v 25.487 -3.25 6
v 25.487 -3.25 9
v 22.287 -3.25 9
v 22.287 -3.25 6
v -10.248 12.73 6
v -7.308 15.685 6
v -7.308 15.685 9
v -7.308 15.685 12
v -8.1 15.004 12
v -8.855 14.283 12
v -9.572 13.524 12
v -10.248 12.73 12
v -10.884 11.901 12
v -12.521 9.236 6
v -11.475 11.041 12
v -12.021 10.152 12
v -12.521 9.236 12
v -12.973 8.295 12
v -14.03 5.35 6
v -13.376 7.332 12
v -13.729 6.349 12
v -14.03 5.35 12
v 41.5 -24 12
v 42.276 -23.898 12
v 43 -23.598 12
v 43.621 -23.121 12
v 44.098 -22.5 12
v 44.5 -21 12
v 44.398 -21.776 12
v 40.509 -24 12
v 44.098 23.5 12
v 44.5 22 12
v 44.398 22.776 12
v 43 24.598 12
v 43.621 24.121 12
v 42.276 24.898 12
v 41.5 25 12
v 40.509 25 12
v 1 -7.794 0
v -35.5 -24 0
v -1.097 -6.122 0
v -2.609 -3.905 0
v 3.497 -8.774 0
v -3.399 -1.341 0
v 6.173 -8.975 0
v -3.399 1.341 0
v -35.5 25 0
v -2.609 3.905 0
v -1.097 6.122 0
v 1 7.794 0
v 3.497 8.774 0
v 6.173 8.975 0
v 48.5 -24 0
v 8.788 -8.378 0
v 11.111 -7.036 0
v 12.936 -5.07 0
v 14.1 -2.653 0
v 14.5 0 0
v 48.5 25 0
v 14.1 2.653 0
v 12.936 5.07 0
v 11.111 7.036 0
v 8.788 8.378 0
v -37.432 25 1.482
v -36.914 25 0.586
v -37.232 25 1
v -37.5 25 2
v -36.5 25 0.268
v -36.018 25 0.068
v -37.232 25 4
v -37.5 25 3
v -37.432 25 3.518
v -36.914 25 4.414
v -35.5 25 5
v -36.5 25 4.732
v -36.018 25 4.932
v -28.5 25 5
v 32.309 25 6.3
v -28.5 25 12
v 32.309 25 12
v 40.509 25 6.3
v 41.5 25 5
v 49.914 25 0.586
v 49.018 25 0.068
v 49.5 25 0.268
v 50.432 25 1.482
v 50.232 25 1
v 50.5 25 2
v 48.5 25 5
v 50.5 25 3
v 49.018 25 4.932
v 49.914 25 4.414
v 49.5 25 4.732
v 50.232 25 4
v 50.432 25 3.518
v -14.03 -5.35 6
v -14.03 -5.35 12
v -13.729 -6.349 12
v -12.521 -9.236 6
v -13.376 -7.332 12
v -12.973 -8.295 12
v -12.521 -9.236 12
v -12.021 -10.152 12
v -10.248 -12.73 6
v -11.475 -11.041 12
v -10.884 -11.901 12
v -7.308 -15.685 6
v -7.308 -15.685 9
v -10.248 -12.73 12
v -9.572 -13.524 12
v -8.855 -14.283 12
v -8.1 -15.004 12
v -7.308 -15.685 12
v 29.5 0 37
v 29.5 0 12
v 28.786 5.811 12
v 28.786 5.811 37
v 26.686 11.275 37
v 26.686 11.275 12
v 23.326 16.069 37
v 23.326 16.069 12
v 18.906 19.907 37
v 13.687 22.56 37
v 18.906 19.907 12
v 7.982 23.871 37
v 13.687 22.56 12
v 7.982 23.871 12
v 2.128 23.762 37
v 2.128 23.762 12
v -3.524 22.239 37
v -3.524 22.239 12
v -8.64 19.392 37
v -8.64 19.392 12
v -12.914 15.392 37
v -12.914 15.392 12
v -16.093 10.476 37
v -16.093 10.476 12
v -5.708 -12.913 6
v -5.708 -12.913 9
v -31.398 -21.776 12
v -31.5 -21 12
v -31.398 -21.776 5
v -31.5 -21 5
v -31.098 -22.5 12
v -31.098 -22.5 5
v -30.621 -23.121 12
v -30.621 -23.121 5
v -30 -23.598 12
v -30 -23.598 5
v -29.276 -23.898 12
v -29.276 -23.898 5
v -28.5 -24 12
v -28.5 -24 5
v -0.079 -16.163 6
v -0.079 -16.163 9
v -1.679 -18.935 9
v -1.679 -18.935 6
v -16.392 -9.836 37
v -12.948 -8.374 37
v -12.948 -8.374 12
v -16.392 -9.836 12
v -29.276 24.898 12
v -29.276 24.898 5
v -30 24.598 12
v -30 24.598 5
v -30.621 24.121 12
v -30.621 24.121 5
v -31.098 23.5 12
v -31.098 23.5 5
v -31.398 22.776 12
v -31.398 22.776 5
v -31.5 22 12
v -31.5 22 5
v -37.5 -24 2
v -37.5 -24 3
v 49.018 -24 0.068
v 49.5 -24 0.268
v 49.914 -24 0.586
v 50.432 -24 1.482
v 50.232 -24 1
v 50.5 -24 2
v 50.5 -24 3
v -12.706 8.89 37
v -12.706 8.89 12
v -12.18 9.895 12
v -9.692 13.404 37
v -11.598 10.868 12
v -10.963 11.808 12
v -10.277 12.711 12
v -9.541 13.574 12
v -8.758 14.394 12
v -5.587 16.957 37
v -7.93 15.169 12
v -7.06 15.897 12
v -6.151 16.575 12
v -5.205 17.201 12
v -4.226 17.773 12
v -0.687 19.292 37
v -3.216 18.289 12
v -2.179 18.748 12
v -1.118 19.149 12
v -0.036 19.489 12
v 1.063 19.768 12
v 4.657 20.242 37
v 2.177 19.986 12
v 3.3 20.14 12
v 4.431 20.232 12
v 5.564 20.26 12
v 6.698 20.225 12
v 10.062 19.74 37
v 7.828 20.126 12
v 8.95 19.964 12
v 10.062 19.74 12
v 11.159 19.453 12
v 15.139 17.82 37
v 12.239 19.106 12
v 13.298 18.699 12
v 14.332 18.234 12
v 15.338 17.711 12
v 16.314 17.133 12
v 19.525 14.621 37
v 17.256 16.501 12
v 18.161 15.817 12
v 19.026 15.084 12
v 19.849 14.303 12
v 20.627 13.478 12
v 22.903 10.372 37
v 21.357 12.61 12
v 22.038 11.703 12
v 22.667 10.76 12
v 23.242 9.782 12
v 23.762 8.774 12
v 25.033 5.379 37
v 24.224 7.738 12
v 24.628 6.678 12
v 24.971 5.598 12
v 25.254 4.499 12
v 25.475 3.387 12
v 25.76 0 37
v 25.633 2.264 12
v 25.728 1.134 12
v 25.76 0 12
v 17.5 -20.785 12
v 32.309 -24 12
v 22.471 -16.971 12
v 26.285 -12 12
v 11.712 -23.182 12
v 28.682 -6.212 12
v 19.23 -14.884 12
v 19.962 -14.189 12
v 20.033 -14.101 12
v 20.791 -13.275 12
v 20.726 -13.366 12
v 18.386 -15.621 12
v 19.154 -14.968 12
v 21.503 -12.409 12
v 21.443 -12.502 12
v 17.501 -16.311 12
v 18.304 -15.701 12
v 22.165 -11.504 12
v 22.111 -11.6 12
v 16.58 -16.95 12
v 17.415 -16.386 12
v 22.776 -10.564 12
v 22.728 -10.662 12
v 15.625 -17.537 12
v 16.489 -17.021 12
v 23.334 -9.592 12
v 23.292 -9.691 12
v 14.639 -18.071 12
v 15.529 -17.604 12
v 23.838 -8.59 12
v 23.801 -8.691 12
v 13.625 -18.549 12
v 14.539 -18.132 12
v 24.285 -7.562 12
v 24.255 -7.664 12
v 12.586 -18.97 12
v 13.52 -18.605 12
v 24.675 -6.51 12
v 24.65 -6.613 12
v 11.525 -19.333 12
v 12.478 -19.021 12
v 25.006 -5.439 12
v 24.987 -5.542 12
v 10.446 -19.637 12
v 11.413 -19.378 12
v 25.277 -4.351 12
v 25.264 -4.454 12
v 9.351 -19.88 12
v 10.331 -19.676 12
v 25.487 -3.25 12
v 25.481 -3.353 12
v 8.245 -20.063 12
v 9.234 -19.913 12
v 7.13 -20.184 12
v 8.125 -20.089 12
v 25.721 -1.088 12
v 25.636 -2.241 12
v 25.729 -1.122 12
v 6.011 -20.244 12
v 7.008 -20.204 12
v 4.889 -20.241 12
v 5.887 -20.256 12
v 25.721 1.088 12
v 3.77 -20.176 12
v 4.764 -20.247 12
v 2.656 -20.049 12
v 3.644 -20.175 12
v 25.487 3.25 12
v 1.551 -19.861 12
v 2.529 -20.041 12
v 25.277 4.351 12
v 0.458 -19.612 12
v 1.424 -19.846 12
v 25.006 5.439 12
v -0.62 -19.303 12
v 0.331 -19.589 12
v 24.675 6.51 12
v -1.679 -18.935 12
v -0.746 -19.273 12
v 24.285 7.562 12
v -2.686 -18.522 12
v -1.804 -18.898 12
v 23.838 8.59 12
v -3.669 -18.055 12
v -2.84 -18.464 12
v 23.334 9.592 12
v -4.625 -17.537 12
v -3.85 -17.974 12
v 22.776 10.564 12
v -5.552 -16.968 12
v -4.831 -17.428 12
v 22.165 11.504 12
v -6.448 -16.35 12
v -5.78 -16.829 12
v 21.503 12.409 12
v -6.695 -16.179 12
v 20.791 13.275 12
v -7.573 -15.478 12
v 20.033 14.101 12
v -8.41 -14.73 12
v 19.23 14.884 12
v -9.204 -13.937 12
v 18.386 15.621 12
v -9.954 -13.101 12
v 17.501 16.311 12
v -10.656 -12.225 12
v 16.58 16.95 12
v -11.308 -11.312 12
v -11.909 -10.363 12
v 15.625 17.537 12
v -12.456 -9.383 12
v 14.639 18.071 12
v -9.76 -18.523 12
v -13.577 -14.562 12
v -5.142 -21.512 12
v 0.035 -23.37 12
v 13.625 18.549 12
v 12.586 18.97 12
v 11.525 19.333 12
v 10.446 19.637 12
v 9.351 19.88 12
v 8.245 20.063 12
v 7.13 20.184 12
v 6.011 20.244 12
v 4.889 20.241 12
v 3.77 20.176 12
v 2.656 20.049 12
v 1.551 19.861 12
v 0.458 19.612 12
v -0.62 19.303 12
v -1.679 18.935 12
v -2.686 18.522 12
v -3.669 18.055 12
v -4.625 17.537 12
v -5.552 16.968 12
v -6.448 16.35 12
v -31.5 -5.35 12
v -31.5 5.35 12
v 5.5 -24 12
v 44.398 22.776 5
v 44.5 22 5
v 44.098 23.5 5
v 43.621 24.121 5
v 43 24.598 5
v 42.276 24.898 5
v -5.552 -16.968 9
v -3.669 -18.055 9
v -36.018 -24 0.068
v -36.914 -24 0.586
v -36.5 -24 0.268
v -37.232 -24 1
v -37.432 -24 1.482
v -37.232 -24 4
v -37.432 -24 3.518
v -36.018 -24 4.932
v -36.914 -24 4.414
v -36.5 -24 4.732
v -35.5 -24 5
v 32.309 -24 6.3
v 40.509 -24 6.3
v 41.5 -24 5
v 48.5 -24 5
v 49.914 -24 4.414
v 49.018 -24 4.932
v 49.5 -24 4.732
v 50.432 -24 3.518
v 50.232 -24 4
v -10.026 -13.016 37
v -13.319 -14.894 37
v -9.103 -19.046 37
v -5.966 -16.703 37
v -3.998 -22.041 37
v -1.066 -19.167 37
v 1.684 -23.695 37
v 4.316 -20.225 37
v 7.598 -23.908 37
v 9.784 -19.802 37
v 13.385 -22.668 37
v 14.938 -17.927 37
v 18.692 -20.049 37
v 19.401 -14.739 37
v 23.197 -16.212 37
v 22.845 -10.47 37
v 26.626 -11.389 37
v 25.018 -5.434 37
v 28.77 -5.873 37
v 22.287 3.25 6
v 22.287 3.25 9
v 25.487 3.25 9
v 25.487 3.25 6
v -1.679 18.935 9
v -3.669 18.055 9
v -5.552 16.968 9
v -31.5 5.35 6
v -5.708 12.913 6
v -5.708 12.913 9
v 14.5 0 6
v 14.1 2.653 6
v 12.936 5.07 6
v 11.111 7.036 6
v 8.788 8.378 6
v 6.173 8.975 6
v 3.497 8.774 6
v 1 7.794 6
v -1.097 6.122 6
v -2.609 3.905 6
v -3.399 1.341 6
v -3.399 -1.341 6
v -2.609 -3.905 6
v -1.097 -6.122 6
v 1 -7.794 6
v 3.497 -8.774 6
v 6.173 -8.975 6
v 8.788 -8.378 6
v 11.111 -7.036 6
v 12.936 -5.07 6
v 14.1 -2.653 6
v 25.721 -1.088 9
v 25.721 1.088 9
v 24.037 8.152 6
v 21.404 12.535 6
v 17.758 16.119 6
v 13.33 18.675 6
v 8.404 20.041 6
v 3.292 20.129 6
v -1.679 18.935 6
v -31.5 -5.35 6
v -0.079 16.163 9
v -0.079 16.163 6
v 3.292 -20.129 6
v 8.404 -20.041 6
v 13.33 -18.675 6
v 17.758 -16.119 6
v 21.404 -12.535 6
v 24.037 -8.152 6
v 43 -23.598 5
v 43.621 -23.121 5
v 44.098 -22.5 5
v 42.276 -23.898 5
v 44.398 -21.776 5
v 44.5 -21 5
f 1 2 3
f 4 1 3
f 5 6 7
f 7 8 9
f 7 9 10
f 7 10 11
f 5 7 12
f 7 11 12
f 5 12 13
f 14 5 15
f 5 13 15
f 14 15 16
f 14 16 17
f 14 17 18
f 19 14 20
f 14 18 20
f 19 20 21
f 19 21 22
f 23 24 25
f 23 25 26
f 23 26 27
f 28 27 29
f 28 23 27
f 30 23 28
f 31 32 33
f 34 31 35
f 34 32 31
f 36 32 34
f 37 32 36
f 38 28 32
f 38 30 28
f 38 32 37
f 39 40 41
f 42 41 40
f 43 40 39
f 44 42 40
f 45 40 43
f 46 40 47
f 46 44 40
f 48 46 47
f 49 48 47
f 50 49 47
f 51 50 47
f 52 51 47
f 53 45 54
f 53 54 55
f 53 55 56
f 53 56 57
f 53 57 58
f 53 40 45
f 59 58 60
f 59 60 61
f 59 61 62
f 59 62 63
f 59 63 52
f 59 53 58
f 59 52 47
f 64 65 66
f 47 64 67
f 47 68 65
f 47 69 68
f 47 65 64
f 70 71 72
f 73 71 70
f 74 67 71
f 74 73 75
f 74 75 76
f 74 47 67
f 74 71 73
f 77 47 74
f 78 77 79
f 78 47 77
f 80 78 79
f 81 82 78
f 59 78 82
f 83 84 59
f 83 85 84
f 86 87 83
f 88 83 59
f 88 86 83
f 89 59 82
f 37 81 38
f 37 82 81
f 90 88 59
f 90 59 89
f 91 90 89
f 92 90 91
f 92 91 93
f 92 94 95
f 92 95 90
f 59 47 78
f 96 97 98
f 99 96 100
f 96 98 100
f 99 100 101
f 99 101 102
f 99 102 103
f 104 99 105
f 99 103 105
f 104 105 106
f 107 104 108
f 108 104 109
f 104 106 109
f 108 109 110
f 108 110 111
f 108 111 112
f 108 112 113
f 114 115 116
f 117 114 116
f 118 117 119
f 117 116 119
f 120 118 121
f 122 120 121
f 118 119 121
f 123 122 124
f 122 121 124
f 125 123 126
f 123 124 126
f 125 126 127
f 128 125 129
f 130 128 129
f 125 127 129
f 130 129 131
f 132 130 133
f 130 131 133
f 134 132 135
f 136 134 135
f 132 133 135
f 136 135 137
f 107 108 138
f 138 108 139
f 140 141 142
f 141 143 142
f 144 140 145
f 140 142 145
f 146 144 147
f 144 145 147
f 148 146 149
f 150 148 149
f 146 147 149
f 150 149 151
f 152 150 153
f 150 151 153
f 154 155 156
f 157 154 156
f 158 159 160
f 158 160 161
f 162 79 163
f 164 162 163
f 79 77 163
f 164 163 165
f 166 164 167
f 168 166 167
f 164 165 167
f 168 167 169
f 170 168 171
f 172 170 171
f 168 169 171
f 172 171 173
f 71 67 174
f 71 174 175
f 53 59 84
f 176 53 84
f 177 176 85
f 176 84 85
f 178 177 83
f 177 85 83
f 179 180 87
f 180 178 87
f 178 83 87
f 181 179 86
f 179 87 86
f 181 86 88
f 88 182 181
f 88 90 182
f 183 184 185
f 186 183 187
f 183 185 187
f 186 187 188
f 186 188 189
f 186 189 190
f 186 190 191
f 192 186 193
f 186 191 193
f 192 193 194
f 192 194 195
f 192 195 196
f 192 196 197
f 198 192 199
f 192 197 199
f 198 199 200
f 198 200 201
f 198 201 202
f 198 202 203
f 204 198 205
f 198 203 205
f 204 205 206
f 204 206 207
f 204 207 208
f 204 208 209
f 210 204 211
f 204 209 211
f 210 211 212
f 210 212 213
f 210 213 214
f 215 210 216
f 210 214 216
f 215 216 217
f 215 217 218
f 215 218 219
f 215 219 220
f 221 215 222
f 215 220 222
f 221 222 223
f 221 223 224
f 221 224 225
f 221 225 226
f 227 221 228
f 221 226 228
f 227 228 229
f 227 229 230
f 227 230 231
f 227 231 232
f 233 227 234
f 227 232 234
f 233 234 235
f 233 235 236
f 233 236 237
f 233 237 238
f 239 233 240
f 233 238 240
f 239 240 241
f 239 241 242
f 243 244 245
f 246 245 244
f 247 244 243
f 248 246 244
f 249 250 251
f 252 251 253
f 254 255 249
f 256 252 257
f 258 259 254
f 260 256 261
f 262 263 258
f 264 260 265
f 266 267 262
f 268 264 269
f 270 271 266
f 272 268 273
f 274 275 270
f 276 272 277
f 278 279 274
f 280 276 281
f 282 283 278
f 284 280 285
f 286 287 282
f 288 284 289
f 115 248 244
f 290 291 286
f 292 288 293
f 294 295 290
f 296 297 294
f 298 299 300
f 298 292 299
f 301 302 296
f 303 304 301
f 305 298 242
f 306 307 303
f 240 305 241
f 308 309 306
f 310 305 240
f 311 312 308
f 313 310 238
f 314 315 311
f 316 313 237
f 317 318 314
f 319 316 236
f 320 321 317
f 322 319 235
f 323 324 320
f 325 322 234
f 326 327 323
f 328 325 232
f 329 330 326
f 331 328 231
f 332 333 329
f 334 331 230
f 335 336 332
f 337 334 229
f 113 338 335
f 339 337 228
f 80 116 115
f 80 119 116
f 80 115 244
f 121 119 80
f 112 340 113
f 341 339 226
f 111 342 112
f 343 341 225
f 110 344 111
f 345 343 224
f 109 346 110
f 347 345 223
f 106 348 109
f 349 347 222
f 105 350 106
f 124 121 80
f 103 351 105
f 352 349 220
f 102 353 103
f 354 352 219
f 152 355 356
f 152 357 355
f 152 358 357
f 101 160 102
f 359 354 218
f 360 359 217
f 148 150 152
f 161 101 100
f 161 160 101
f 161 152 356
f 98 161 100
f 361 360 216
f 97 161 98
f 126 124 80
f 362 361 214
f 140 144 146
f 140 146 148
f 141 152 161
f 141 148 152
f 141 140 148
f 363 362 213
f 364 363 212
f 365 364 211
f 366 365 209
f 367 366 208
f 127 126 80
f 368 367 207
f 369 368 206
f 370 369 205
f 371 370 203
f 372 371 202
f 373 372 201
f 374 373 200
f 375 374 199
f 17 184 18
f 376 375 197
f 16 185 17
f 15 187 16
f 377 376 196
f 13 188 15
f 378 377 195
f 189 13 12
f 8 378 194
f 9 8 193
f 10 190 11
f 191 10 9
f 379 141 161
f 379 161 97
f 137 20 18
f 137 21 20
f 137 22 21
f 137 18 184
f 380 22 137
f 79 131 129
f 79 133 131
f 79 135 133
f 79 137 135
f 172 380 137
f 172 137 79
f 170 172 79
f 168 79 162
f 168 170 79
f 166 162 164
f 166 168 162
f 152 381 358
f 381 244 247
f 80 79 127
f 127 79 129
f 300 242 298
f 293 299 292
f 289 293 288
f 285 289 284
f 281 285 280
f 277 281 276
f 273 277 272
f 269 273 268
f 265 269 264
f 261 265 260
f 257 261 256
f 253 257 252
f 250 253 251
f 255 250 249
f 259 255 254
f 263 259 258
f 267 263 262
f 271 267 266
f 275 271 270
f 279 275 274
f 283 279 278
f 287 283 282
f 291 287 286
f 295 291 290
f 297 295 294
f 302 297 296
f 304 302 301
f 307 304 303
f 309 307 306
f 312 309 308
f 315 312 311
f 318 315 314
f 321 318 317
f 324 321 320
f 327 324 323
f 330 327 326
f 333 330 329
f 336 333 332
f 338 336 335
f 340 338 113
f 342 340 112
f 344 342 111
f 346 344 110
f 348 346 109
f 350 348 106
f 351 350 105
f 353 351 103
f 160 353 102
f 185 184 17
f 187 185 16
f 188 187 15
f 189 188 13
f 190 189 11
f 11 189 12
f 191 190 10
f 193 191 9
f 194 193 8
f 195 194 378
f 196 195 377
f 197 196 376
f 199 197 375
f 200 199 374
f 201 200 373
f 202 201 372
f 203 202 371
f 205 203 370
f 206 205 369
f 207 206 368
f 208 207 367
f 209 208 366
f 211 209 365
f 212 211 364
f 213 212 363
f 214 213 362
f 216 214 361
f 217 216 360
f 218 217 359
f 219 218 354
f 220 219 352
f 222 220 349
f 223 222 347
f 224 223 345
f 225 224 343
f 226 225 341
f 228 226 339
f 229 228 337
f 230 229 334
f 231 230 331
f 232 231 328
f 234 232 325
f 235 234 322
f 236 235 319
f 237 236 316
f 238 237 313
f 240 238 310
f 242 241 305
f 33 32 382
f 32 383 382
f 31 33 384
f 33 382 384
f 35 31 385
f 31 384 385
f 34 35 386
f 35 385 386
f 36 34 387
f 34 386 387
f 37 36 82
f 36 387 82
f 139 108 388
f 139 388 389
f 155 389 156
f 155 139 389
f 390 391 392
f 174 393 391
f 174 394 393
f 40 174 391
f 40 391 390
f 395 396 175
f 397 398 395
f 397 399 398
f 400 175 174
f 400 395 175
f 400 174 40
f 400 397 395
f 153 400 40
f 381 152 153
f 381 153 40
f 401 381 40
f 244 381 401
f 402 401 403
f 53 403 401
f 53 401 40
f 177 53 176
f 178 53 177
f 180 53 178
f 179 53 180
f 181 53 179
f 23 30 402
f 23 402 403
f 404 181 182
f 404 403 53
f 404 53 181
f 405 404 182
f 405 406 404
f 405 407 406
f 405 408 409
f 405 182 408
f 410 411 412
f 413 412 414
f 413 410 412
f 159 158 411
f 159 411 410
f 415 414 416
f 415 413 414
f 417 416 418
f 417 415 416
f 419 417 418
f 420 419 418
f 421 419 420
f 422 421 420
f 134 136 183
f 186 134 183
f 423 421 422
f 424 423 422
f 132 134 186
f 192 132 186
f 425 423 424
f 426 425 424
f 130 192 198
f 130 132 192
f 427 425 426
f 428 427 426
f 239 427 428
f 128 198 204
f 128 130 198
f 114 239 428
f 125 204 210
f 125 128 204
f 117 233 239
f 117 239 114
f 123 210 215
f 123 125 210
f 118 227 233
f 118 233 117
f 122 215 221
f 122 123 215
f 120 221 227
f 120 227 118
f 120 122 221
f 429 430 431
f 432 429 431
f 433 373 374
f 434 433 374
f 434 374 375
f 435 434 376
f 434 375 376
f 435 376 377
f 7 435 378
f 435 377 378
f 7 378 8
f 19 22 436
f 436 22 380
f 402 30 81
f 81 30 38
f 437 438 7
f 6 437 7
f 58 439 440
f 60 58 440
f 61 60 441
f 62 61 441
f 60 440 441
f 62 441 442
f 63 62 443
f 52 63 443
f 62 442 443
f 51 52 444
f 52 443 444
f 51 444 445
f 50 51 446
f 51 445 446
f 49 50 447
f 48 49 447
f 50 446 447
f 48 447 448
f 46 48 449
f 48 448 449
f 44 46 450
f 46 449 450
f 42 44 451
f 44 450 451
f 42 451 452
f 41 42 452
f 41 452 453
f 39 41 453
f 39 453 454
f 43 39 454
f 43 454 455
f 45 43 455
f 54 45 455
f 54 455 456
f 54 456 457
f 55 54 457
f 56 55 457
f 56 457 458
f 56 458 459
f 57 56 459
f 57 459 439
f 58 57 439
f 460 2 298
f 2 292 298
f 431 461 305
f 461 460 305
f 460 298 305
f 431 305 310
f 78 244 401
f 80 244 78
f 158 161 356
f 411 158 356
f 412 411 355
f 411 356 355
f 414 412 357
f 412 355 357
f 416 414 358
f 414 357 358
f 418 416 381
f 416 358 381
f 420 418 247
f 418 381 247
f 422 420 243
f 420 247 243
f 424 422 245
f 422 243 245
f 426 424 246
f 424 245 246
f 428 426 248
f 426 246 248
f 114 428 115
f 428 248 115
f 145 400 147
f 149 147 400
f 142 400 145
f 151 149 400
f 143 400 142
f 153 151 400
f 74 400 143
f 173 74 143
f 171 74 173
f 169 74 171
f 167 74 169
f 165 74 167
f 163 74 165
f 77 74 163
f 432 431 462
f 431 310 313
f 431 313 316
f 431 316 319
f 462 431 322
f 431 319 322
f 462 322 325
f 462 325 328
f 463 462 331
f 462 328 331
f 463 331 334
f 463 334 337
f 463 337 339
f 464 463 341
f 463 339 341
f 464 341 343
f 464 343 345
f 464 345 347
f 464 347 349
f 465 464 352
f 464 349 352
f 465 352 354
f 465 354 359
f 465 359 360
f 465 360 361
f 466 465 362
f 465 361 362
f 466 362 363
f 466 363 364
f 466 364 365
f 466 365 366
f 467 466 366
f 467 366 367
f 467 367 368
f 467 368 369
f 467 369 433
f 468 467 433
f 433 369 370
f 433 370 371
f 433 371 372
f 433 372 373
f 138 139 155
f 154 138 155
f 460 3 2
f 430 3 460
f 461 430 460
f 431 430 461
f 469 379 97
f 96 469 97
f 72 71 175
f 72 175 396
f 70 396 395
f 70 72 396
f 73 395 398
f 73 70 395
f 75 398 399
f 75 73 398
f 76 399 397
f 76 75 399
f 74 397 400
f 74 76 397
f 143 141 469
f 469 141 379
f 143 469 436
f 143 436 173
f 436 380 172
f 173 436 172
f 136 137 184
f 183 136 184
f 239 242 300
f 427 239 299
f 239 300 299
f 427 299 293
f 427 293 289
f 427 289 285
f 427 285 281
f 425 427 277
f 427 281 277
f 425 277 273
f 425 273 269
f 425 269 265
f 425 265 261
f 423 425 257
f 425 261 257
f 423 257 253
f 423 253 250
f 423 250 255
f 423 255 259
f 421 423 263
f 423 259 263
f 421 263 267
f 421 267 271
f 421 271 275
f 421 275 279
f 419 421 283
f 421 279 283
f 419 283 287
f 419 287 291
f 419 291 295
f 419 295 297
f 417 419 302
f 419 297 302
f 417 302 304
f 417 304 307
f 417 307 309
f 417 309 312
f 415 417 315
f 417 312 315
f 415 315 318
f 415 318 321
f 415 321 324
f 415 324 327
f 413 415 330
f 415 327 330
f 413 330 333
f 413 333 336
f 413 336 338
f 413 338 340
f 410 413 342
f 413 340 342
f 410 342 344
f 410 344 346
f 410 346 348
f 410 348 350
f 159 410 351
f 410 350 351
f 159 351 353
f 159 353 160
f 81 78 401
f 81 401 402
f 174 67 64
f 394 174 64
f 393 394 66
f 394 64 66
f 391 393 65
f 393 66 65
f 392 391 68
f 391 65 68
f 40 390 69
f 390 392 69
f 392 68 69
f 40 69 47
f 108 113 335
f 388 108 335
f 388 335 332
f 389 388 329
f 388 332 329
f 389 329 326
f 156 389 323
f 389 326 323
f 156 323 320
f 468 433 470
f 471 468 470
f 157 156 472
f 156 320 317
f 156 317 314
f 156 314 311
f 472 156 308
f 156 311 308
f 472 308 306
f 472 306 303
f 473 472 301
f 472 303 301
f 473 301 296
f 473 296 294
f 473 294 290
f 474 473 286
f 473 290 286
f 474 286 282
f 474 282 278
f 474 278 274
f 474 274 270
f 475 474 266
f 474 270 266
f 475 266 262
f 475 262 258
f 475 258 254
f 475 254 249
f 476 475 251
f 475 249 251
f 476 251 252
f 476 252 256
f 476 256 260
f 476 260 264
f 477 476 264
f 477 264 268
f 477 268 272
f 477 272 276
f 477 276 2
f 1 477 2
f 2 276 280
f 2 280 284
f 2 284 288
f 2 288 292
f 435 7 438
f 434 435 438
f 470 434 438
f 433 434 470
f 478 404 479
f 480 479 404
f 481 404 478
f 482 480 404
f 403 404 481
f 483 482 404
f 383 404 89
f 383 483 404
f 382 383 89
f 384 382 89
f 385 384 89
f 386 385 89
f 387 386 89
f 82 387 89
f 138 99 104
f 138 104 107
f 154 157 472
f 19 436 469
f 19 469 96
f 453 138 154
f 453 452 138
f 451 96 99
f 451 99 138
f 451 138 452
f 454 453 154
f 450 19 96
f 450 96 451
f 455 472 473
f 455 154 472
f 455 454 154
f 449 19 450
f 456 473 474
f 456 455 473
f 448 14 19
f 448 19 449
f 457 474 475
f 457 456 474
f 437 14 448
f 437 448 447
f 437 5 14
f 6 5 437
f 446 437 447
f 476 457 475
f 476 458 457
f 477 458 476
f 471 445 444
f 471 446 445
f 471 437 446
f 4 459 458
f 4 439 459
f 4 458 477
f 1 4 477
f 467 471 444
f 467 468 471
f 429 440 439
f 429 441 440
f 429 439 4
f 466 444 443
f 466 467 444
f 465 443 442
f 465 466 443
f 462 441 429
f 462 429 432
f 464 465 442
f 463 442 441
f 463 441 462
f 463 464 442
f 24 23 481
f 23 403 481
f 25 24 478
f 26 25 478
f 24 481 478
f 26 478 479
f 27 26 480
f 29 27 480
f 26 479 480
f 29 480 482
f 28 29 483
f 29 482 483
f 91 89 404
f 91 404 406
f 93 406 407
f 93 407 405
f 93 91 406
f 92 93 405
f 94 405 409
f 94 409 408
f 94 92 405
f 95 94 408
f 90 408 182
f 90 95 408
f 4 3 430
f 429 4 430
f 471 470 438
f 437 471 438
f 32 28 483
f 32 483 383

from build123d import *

# Parameters (mm, degrees)
SKETCH1_W           = 65
SKETCH1_H           = 50
BOSS_EXTRUDE1_DEPTH = 12
CUT_EXTRUDE1_DEPTH  = 6
SKETCH3_R           = 9
CUT_EXTRUDE2_DEPTH  = 7
SKETCH4_R           = 20.25
CUT_EXTRUDE3_DEPTH  = 3
SKETCH5_W           = 12
SKETCH5_H           = 50
BOSS_EXTRUDE2_DEPTH = 13
SKETCH6_W           = 8.2
SKETCH6_H           = 50
CUT_EXTRUDE4_DEPTH  = 5.7
SKETCH7_W           = 5
SKETCH7_H           = 50
BOSS_EXTRUDE3_DEPTH = 5
SKETCH8_W           = 5
SKETCH8_H           = 50
BOSS_EXTRUDE4_DEPTH = 5
FILLET1_R           = 2
FILLET2_R           = 2
BOSS_EXTRUDE6_DEPTH = 25
FILLET3_R           = 2
FILLET4_R           = 2
SKETCH10_W          = 1
SKETCH10_H          = 50
CUT_EXTRUDE5_DEPTH  = 7
SKETCH11_W          = 88
SKETCH11_H          = 1
CUT_EXTRUDE6_DEPTH  = 13
FILLET5_R           = 3
FILLET6_R           = 3
FILLET7_R           = 3
FILLET8_R           = 3


with BuildPart() as part:
    # Sketch1 → Boss-Extrude1 (new body)
    with BuildSketch(Plane.XY):
        Rectangle(SKETCH1_W, SKETCH1_H)
    extrude(amount=BOSS_EXTRUDE1_DEPTH)

    # Sketch2 → Cut-Extrude1 (cut)
    with BuildSketch(Plane.XY.offset(12)):
        with BuildLine():
            Line((-0.079165483, -16.163398081), (-1.679165483, -18.934679373))
            ThreePointArc((-1.679165483, -18.934679373), (15.625, -17.537014427), (25.487496091, -3.25))
            Line((25.487496091, -3.25), (22.287496091, -3.25))
            Line((22.287496091, -3.25), (22.287496091, 3.25))
            Line((22.287496091, 3.25), (25.487496091, 3.25))
            ThreePointArc((25.487496091, 3.25), (15.625, 17.537014427), (-1.679165483, 18.934679373))
            Line((-1.679165483, 18.934679373), (-0.079165483, 16.163398081))
            Line((-0.079165483, 16.163398081), (-5.708330608, 12.913398081))
            Line((-5.708330608, 12.913398081), (-7.308330608, 15.684679373))
            ThreePointArc((-7.308330608, 15.684679373), (-11.475017308, 11.041344456), (-14.030488985, 5.35))
            Line((-14.030488985, 5.35), (-14.030488985, -5.35))
            ThreePointArc((-14.030488985, -5.35), (-11.475017308, -11.041344456), (-7.308330608, -15.684679373))
            Line((-7.308330608, -15.684679373), (-5.708330608, -12.913398081))
            Line((-5.708330608, -12.913398081), (-0.079165483, -16.163398081))
        make_face()
        with BuildLine():
            Line((-44.030488985, -5.35), (-14.030488985, -5.35))
            ThreePointArc((-14.030488985, -5.35), (-14.75, 0), (-14.030488985, 5.35))
            Line((-14.030488985, 5.35), (-44.030488985, 5.35))
            Line((-44.030488985, 5.35), (-44.030488985, -5.35))
        make_face()
        with BuildLine():
            ThreePointArc((-14.030488985, 5.35), (-14.75, 0), (-14.030488985, -5.35))
            Line((-14.030488985, -5.35), (-14.030488985, 5.35))
        make_face()
    extrude(amount=-CUT_EXTRUDE1_DEPTH, mode=Mode.SUBTRACT)

    # Sketch3 → Cut-Extrude2 (cut, through all)
    with BuildSketch(Plane.XY.offset(6)):
        with Locations((5.5, 0)):
            Circle(SKETCH3_R)
    extrude(amount=-CUT_EXTRUDE2_DEPTH, mode=Mode.SUBTRACT)

    # Sketch4 → Cut-Extrude3 (cut)
    with BuildSketch(Plane.XY.offset(12)):
        with Locations((5.5, 0)):
            Circle(SKETCH4_R)
    extrude(amount=-CUT_EXTRUDE3_DEPTH, mode=Mode.SUBTRACT)

    # Sketch5 → Boss-Extrude2 (add)
    with BuildSketch(Plane(origin=(32.5, 0, 0), x_dir=(0, 0, -1), z_dir=(1, 0, 0))):
        with Locations((-6, 0)):
            Rectangle(SKETCH5_W, SKETCH5_H)
    extrude(amount=BOSS_EXTRUDE2_DEPTH)

    # Sketch6 → Cut-Extrude4 (cut)
    with BuildSketch(Plane.XY.offset(12)):
        with Locations((36.409019421, 0)):
            Rectangle(SKETCH6_W, SKETCH6_H)
    extrude(amount=-CUT_EXTRUDE4_DEPTH, mode=Mode.SUBTRACT)

    # Sketch7 → Boss-Extrude3 (add)
    with BuildSketch(Plane(origin=(45.5, 0, 0), x_dir=(0, 0, -1), z_dir=(1, 0, 0))):
        with Locations((-2.5, 0)):
            Rectangle(SKETCH7_W, SKETCH7_H)
    extrude(amount=BOSS_EXTRUDE3_DEPTH)

    # Sketch8 → Boss-Extrude4 (add)
    with BuildSketch(Plane.ZY.offset(32.5)):
        with Locations((2.5, 0)):
            Rectangle(SKETCH8_W, SKETCH8_H)
    extrude(amount=BOSS_EXTRUDE4_DEPTH)

    # Fillet1
    fillet1_edges = [part.edges().sort_by_distance(p)[0] for p in [
        (50.5, 0, 5),
    ]]
    fillet(fillet1_edges, radius=FILLET1_R)

    # Fillet2
    fillet2_edges = [part.edges().sort_by_distance(p)[0] for p in [
        (-37.5, 0, 5),
    ]]
    fillet(fillet2_edges, radius=FILLET2_R)

    # Sketch9 → Boss-Extrude6 (add)
    with BuildSketch(Plane.XY.offset(12)):
        with BuildLine():
            Line((-16.092960793, 10.475879161), (-12.705503837, 8.889726094))
            ThreePointArc((-12.705503837, 8.889726094), (10.062022154, 19.739694878), (25.76, 0))
            ThreePointArc((25.76, 0), (9.783964079, -19.801900206), (-12.948317056, -8.374198339))
            Line((-12.948317056, -8.374198339), (-16.391781636, -9.83615254))
            ThreePointArc((-16.391781636, -9.83615254), (10.529773391, -23.467027499), (29.5, 0))
            ThreePointArc((29.5, 0), (10.874427457, 23.390500839), (-16.092960793, 10.475879161))
        make_face()
    extrude(amount=BOSS_EXTRUDE6_DEPTH)

    # Fillet3
    fillet3_edges = [part.edges().sort_by_distance(p)[0] for p in [
        (-37.5, 0, 0),
    ]]
    fillet(fillet3_edges, radius=FILLET3_R)

    # Fillet4
    fillet4_edges = [part.edges().sort_by_distance(p)[0] for p in [
        (50.5, 0, 0),
    ]]
    fillet(fillet4_edges, radius=FILLET4_R)

    # Sketch10 → Cut-Extrude5 (cut)
    with BuildSketch(Plane.XY.offset(12)):
        with Locations((45, 0)):
            Rectangle(SKETCH10_W, SKETCH10_H)
        with Locations((-32, 0)):
            Rectangle(SKETCH10_W, SKETCH10_H)
    extrude(amount=-CUT_EXTRUDE5_DEPTH, mode=Mode.SUBTRACT)

    # Sketch11 → Cut-Extrude6 (cut, through all)
    with BuildSketch(Plane.XY.offset(12)):
        with Locations((6.5, -24.5)):
            Rectangle(SKETCH11_W, SKETCH11_H)
    extrude(amount=-CUT_EXTRUDE6_DEPTH, mode=Mode.SUBTRACT)

    # Fillet5
    fillet5_edges = [part.edges().sort_by_distance(p)[0] for p in [
        (44.5, -24, 8.5),
    ]]
    fillet(fillet5_edges, radius=FILLET5_R)

    # Fillet6
    fillet6_edges = [part.edges().sort_by_distance(p)[0] for p in [
        (44.5, 25, 8.5),
    ]]
    fillet(fillet6_edges, radius=FILLET6_R)

    # Fillet7
    fillet7_edges = [part.edges().sort_by_distance(p)[0] for p in [
        (-31.5, 25, 8.5),
    ]]
    fillet(fillet7_edges, radius=FILLET7_R)

    # Fillet8
    fillet8_edges = [part.edges().sort_by_distance(p)[0] for p in [
        (-31.5, -24, 8.5),
    ]]
    fillet(fillet8_edges, radius=FILLET8_R)


solid = part.part
